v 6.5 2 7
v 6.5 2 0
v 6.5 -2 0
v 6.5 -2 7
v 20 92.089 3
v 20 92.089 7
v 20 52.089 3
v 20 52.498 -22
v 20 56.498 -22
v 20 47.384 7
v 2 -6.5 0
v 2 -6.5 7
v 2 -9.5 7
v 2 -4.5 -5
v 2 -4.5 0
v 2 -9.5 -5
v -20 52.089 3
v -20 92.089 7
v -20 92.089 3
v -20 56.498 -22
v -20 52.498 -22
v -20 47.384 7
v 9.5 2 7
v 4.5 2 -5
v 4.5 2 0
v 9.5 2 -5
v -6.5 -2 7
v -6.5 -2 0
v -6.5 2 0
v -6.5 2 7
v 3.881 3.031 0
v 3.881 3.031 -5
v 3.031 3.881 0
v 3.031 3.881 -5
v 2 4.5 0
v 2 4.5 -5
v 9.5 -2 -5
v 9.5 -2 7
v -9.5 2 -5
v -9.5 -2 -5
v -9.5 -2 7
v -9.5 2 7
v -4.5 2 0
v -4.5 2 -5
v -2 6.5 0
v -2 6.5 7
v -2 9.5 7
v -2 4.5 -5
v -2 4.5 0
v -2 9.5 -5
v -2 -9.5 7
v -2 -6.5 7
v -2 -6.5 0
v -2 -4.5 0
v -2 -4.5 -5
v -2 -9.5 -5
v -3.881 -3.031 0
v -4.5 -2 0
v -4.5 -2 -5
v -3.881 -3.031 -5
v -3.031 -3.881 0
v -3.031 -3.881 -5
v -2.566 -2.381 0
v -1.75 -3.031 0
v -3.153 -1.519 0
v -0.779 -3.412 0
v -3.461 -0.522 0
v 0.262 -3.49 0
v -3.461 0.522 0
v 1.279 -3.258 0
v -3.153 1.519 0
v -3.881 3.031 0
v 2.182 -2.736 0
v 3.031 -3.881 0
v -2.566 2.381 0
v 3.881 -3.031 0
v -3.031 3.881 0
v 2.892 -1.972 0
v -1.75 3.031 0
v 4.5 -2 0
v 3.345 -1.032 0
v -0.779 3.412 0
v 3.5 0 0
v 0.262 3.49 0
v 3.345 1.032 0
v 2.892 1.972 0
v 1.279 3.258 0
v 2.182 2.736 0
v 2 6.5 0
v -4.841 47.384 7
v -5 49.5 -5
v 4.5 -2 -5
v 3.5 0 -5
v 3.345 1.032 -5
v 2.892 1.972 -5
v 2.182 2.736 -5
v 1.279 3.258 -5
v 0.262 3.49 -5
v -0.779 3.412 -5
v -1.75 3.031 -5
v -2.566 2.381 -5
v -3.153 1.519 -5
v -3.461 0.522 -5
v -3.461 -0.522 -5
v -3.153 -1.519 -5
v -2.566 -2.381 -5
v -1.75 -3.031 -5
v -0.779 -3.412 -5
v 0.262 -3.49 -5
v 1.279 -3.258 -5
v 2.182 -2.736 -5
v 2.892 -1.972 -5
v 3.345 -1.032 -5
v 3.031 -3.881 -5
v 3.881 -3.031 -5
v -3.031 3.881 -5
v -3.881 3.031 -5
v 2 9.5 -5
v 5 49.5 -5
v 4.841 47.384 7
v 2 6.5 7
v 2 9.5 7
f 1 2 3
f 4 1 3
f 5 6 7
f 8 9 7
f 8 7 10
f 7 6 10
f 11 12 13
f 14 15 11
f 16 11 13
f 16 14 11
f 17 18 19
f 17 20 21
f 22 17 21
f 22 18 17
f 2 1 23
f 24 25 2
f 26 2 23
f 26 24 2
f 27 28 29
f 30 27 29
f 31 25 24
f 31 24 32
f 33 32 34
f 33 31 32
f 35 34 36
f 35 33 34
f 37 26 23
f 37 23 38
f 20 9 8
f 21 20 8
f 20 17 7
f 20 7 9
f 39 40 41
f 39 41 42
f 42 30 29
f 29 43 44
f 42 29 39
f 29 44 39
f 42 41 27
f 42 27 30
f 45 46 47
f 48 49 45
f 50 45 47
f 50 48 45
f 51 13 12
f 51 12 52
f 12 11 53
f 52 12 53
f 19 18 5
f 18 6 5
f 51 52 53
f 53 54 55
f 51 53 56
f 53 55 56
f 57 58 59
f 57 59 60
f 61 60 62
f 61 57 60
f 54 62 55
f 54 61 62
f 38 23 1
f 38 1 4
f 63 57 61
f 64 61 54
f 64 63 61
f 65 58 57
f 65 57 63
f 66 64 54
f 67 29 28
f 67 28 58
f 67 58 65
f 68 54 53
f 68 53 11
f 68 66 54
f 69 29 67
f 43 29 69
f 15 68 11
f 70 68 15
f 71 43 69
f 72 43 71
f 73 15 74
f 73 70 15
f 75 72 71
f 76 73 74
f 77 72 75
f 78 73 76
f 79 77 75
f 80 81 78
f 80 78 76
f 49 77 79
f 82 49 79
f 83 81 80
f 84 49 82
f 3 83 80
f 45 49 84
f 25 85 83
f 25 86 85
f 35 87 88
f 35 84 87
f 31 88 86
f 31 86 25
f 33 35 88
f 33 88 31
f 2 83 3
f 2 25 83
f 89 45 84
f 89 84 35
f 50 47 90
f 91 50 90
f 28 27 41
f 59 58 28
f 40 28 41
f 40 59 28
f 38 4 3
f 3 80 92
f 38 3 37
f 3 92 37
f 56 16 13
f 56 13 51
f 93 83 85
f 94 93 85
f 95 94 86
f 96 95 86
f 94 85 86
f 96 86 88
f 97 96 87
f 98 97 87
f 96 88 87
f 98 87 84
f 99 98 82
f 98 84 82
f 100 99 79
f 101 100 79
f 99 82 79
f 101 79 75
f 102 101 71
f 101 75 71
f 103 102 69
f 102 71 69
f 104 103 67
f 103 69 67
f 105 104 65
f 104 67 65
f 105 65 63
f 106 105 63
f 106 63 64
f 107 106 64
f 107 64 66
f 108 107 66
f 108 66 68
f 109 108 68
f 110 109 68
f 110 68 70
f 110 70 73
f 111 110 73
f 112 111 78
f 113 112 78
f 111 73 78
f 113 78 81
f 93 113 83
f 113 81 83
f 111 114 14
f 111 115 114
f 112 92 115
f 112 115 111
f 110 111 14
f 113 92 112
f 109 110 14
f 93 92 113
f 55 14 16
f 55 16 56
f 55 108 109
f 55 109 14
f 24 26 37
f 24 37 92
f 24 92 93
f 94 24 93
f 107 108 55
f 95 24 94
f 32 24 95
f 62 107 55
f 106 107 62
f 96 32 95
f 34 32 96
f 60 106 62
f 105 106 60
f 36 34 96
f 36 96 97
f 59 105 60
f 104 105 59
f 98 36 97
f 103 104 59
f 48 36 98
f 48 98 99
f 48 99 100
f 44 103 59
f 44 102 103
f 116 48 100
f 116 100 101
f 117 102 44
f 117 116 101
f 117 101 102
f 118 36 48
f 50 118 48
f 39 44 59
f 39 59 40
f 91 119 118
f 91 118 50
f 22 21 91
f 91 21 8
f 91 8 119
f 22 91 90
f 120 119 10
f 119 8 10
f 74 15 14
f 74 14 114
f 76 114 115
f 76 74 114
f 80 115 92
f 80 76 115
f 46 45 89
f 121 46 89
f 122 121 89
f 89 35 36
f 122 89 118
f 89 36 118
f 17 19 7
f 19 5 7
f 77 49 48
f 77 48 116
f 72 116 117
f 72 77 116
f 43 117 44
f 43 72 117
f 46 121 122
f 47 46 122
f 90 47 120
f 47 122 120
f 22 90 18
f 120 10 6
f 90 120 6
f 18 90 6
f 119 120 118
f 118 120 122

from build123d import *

# Parameters (mm, degrees)
SKETCH_R           = 3.5
PAD_DEPTH          = 5
SKETCH001_W        = 4
SKETCH001_H        = 3
PAD001_DEPTH       = 7
POLARPATTERN_COUNT = 4
PAD002_DEPTH       = 7
PAD004_DEPTH       = 5
PAD005_DEPTH       = 20


with BuildPart() as part:
    # Sketch → Pad (new body)
    with BuildSketch(Plane.XY):
        with BuildLine():
            Line((-9.5, 2), (-9.5, -2))
            Line((-9.5, -2), (-4.5, -2))
            ThreePointArc((-4.5, -2), (-3.482097, -3.482097), (-2, -4.5))
            Line((-2, -9.5), (-2, -4.5))
            Line((-2, -9.5), (2, -9.5))
            Line((2, -9.5), (2, -4.5))
            ThreePointArc((2, -4.5), (3.482097, -3.482097), (4.5, -2))
            Line((9.5, -2), (4.5, -2))
            Line((9.5, -2), (9.5, 2))
            Line((9.5, 2), (4.5, 2))
            ThreePointArc((4.5, 2), (3.482097, 3.482097), (2, 4.5))
            Line((2, 9.5), (2, 4.5))
            Line((2, 9.5), (-2, 9.5))
            Line((-2, 9.5), (-2, 4.5))
            ThreePointArc((-2, 4.5), (-3.482097, 3.482097), (-4.5, 2))
            Line((-9.5, 2), (-4.5, 2))
        make_face()
        Circle(SKETCH_R, mode=Mode.SUBTRACT)
    extrude(amount=-PAD_DEPTH)

    # Sketch001 → Pad001 (join)
    with BuildSketch(Plane.XY):
        with Locations((0, 8)):
            Rectangle(SKETCH001_W, SKETCH001_H)
    pad001 = extrude(amount=PAD001_DEPTH)

    # PolarPattern: Pad001 ×4 about axis
    polarpattern_axis = Axis((0, 0, 0), (0, 0, 1))
    for i in range(1, POLARPATTERN_COUNT):
        add(pad001.rotate(polarpattern_axis, i * 360 / POLARPATTERN_COUNT))

    # Sketch002 → Pad002 (join)
    with BuildSketch(Plane.XY):
        Polygon((-2, 9.5), (-5, 49.5), (5, 49.5), (2, 9.5), align=None)
    extrude(amount=PAD002_DEPTH)

    # Sketch002 → Pad004 (join)
    with BuildSketch(Plane.XY):
        Polygon((-2, 9.5), (-5, 49.5), (5, 49.5), (2, 9.5), align=None)
    extrude(amount=-PAD004_DEPTH)

    # Sketch003 → Pad005 (join, symmetric)
    with BuildSketch(Plane.YZ):
        Polygon((47.384076, 7), (92.089384, 7), (92.089384, 3), (52.089384, 3), (56.497559, -22), (52.497559, -22), align=None)
    extrude(amount=PAD005_DEPTH, both=True)


solid = part.part
